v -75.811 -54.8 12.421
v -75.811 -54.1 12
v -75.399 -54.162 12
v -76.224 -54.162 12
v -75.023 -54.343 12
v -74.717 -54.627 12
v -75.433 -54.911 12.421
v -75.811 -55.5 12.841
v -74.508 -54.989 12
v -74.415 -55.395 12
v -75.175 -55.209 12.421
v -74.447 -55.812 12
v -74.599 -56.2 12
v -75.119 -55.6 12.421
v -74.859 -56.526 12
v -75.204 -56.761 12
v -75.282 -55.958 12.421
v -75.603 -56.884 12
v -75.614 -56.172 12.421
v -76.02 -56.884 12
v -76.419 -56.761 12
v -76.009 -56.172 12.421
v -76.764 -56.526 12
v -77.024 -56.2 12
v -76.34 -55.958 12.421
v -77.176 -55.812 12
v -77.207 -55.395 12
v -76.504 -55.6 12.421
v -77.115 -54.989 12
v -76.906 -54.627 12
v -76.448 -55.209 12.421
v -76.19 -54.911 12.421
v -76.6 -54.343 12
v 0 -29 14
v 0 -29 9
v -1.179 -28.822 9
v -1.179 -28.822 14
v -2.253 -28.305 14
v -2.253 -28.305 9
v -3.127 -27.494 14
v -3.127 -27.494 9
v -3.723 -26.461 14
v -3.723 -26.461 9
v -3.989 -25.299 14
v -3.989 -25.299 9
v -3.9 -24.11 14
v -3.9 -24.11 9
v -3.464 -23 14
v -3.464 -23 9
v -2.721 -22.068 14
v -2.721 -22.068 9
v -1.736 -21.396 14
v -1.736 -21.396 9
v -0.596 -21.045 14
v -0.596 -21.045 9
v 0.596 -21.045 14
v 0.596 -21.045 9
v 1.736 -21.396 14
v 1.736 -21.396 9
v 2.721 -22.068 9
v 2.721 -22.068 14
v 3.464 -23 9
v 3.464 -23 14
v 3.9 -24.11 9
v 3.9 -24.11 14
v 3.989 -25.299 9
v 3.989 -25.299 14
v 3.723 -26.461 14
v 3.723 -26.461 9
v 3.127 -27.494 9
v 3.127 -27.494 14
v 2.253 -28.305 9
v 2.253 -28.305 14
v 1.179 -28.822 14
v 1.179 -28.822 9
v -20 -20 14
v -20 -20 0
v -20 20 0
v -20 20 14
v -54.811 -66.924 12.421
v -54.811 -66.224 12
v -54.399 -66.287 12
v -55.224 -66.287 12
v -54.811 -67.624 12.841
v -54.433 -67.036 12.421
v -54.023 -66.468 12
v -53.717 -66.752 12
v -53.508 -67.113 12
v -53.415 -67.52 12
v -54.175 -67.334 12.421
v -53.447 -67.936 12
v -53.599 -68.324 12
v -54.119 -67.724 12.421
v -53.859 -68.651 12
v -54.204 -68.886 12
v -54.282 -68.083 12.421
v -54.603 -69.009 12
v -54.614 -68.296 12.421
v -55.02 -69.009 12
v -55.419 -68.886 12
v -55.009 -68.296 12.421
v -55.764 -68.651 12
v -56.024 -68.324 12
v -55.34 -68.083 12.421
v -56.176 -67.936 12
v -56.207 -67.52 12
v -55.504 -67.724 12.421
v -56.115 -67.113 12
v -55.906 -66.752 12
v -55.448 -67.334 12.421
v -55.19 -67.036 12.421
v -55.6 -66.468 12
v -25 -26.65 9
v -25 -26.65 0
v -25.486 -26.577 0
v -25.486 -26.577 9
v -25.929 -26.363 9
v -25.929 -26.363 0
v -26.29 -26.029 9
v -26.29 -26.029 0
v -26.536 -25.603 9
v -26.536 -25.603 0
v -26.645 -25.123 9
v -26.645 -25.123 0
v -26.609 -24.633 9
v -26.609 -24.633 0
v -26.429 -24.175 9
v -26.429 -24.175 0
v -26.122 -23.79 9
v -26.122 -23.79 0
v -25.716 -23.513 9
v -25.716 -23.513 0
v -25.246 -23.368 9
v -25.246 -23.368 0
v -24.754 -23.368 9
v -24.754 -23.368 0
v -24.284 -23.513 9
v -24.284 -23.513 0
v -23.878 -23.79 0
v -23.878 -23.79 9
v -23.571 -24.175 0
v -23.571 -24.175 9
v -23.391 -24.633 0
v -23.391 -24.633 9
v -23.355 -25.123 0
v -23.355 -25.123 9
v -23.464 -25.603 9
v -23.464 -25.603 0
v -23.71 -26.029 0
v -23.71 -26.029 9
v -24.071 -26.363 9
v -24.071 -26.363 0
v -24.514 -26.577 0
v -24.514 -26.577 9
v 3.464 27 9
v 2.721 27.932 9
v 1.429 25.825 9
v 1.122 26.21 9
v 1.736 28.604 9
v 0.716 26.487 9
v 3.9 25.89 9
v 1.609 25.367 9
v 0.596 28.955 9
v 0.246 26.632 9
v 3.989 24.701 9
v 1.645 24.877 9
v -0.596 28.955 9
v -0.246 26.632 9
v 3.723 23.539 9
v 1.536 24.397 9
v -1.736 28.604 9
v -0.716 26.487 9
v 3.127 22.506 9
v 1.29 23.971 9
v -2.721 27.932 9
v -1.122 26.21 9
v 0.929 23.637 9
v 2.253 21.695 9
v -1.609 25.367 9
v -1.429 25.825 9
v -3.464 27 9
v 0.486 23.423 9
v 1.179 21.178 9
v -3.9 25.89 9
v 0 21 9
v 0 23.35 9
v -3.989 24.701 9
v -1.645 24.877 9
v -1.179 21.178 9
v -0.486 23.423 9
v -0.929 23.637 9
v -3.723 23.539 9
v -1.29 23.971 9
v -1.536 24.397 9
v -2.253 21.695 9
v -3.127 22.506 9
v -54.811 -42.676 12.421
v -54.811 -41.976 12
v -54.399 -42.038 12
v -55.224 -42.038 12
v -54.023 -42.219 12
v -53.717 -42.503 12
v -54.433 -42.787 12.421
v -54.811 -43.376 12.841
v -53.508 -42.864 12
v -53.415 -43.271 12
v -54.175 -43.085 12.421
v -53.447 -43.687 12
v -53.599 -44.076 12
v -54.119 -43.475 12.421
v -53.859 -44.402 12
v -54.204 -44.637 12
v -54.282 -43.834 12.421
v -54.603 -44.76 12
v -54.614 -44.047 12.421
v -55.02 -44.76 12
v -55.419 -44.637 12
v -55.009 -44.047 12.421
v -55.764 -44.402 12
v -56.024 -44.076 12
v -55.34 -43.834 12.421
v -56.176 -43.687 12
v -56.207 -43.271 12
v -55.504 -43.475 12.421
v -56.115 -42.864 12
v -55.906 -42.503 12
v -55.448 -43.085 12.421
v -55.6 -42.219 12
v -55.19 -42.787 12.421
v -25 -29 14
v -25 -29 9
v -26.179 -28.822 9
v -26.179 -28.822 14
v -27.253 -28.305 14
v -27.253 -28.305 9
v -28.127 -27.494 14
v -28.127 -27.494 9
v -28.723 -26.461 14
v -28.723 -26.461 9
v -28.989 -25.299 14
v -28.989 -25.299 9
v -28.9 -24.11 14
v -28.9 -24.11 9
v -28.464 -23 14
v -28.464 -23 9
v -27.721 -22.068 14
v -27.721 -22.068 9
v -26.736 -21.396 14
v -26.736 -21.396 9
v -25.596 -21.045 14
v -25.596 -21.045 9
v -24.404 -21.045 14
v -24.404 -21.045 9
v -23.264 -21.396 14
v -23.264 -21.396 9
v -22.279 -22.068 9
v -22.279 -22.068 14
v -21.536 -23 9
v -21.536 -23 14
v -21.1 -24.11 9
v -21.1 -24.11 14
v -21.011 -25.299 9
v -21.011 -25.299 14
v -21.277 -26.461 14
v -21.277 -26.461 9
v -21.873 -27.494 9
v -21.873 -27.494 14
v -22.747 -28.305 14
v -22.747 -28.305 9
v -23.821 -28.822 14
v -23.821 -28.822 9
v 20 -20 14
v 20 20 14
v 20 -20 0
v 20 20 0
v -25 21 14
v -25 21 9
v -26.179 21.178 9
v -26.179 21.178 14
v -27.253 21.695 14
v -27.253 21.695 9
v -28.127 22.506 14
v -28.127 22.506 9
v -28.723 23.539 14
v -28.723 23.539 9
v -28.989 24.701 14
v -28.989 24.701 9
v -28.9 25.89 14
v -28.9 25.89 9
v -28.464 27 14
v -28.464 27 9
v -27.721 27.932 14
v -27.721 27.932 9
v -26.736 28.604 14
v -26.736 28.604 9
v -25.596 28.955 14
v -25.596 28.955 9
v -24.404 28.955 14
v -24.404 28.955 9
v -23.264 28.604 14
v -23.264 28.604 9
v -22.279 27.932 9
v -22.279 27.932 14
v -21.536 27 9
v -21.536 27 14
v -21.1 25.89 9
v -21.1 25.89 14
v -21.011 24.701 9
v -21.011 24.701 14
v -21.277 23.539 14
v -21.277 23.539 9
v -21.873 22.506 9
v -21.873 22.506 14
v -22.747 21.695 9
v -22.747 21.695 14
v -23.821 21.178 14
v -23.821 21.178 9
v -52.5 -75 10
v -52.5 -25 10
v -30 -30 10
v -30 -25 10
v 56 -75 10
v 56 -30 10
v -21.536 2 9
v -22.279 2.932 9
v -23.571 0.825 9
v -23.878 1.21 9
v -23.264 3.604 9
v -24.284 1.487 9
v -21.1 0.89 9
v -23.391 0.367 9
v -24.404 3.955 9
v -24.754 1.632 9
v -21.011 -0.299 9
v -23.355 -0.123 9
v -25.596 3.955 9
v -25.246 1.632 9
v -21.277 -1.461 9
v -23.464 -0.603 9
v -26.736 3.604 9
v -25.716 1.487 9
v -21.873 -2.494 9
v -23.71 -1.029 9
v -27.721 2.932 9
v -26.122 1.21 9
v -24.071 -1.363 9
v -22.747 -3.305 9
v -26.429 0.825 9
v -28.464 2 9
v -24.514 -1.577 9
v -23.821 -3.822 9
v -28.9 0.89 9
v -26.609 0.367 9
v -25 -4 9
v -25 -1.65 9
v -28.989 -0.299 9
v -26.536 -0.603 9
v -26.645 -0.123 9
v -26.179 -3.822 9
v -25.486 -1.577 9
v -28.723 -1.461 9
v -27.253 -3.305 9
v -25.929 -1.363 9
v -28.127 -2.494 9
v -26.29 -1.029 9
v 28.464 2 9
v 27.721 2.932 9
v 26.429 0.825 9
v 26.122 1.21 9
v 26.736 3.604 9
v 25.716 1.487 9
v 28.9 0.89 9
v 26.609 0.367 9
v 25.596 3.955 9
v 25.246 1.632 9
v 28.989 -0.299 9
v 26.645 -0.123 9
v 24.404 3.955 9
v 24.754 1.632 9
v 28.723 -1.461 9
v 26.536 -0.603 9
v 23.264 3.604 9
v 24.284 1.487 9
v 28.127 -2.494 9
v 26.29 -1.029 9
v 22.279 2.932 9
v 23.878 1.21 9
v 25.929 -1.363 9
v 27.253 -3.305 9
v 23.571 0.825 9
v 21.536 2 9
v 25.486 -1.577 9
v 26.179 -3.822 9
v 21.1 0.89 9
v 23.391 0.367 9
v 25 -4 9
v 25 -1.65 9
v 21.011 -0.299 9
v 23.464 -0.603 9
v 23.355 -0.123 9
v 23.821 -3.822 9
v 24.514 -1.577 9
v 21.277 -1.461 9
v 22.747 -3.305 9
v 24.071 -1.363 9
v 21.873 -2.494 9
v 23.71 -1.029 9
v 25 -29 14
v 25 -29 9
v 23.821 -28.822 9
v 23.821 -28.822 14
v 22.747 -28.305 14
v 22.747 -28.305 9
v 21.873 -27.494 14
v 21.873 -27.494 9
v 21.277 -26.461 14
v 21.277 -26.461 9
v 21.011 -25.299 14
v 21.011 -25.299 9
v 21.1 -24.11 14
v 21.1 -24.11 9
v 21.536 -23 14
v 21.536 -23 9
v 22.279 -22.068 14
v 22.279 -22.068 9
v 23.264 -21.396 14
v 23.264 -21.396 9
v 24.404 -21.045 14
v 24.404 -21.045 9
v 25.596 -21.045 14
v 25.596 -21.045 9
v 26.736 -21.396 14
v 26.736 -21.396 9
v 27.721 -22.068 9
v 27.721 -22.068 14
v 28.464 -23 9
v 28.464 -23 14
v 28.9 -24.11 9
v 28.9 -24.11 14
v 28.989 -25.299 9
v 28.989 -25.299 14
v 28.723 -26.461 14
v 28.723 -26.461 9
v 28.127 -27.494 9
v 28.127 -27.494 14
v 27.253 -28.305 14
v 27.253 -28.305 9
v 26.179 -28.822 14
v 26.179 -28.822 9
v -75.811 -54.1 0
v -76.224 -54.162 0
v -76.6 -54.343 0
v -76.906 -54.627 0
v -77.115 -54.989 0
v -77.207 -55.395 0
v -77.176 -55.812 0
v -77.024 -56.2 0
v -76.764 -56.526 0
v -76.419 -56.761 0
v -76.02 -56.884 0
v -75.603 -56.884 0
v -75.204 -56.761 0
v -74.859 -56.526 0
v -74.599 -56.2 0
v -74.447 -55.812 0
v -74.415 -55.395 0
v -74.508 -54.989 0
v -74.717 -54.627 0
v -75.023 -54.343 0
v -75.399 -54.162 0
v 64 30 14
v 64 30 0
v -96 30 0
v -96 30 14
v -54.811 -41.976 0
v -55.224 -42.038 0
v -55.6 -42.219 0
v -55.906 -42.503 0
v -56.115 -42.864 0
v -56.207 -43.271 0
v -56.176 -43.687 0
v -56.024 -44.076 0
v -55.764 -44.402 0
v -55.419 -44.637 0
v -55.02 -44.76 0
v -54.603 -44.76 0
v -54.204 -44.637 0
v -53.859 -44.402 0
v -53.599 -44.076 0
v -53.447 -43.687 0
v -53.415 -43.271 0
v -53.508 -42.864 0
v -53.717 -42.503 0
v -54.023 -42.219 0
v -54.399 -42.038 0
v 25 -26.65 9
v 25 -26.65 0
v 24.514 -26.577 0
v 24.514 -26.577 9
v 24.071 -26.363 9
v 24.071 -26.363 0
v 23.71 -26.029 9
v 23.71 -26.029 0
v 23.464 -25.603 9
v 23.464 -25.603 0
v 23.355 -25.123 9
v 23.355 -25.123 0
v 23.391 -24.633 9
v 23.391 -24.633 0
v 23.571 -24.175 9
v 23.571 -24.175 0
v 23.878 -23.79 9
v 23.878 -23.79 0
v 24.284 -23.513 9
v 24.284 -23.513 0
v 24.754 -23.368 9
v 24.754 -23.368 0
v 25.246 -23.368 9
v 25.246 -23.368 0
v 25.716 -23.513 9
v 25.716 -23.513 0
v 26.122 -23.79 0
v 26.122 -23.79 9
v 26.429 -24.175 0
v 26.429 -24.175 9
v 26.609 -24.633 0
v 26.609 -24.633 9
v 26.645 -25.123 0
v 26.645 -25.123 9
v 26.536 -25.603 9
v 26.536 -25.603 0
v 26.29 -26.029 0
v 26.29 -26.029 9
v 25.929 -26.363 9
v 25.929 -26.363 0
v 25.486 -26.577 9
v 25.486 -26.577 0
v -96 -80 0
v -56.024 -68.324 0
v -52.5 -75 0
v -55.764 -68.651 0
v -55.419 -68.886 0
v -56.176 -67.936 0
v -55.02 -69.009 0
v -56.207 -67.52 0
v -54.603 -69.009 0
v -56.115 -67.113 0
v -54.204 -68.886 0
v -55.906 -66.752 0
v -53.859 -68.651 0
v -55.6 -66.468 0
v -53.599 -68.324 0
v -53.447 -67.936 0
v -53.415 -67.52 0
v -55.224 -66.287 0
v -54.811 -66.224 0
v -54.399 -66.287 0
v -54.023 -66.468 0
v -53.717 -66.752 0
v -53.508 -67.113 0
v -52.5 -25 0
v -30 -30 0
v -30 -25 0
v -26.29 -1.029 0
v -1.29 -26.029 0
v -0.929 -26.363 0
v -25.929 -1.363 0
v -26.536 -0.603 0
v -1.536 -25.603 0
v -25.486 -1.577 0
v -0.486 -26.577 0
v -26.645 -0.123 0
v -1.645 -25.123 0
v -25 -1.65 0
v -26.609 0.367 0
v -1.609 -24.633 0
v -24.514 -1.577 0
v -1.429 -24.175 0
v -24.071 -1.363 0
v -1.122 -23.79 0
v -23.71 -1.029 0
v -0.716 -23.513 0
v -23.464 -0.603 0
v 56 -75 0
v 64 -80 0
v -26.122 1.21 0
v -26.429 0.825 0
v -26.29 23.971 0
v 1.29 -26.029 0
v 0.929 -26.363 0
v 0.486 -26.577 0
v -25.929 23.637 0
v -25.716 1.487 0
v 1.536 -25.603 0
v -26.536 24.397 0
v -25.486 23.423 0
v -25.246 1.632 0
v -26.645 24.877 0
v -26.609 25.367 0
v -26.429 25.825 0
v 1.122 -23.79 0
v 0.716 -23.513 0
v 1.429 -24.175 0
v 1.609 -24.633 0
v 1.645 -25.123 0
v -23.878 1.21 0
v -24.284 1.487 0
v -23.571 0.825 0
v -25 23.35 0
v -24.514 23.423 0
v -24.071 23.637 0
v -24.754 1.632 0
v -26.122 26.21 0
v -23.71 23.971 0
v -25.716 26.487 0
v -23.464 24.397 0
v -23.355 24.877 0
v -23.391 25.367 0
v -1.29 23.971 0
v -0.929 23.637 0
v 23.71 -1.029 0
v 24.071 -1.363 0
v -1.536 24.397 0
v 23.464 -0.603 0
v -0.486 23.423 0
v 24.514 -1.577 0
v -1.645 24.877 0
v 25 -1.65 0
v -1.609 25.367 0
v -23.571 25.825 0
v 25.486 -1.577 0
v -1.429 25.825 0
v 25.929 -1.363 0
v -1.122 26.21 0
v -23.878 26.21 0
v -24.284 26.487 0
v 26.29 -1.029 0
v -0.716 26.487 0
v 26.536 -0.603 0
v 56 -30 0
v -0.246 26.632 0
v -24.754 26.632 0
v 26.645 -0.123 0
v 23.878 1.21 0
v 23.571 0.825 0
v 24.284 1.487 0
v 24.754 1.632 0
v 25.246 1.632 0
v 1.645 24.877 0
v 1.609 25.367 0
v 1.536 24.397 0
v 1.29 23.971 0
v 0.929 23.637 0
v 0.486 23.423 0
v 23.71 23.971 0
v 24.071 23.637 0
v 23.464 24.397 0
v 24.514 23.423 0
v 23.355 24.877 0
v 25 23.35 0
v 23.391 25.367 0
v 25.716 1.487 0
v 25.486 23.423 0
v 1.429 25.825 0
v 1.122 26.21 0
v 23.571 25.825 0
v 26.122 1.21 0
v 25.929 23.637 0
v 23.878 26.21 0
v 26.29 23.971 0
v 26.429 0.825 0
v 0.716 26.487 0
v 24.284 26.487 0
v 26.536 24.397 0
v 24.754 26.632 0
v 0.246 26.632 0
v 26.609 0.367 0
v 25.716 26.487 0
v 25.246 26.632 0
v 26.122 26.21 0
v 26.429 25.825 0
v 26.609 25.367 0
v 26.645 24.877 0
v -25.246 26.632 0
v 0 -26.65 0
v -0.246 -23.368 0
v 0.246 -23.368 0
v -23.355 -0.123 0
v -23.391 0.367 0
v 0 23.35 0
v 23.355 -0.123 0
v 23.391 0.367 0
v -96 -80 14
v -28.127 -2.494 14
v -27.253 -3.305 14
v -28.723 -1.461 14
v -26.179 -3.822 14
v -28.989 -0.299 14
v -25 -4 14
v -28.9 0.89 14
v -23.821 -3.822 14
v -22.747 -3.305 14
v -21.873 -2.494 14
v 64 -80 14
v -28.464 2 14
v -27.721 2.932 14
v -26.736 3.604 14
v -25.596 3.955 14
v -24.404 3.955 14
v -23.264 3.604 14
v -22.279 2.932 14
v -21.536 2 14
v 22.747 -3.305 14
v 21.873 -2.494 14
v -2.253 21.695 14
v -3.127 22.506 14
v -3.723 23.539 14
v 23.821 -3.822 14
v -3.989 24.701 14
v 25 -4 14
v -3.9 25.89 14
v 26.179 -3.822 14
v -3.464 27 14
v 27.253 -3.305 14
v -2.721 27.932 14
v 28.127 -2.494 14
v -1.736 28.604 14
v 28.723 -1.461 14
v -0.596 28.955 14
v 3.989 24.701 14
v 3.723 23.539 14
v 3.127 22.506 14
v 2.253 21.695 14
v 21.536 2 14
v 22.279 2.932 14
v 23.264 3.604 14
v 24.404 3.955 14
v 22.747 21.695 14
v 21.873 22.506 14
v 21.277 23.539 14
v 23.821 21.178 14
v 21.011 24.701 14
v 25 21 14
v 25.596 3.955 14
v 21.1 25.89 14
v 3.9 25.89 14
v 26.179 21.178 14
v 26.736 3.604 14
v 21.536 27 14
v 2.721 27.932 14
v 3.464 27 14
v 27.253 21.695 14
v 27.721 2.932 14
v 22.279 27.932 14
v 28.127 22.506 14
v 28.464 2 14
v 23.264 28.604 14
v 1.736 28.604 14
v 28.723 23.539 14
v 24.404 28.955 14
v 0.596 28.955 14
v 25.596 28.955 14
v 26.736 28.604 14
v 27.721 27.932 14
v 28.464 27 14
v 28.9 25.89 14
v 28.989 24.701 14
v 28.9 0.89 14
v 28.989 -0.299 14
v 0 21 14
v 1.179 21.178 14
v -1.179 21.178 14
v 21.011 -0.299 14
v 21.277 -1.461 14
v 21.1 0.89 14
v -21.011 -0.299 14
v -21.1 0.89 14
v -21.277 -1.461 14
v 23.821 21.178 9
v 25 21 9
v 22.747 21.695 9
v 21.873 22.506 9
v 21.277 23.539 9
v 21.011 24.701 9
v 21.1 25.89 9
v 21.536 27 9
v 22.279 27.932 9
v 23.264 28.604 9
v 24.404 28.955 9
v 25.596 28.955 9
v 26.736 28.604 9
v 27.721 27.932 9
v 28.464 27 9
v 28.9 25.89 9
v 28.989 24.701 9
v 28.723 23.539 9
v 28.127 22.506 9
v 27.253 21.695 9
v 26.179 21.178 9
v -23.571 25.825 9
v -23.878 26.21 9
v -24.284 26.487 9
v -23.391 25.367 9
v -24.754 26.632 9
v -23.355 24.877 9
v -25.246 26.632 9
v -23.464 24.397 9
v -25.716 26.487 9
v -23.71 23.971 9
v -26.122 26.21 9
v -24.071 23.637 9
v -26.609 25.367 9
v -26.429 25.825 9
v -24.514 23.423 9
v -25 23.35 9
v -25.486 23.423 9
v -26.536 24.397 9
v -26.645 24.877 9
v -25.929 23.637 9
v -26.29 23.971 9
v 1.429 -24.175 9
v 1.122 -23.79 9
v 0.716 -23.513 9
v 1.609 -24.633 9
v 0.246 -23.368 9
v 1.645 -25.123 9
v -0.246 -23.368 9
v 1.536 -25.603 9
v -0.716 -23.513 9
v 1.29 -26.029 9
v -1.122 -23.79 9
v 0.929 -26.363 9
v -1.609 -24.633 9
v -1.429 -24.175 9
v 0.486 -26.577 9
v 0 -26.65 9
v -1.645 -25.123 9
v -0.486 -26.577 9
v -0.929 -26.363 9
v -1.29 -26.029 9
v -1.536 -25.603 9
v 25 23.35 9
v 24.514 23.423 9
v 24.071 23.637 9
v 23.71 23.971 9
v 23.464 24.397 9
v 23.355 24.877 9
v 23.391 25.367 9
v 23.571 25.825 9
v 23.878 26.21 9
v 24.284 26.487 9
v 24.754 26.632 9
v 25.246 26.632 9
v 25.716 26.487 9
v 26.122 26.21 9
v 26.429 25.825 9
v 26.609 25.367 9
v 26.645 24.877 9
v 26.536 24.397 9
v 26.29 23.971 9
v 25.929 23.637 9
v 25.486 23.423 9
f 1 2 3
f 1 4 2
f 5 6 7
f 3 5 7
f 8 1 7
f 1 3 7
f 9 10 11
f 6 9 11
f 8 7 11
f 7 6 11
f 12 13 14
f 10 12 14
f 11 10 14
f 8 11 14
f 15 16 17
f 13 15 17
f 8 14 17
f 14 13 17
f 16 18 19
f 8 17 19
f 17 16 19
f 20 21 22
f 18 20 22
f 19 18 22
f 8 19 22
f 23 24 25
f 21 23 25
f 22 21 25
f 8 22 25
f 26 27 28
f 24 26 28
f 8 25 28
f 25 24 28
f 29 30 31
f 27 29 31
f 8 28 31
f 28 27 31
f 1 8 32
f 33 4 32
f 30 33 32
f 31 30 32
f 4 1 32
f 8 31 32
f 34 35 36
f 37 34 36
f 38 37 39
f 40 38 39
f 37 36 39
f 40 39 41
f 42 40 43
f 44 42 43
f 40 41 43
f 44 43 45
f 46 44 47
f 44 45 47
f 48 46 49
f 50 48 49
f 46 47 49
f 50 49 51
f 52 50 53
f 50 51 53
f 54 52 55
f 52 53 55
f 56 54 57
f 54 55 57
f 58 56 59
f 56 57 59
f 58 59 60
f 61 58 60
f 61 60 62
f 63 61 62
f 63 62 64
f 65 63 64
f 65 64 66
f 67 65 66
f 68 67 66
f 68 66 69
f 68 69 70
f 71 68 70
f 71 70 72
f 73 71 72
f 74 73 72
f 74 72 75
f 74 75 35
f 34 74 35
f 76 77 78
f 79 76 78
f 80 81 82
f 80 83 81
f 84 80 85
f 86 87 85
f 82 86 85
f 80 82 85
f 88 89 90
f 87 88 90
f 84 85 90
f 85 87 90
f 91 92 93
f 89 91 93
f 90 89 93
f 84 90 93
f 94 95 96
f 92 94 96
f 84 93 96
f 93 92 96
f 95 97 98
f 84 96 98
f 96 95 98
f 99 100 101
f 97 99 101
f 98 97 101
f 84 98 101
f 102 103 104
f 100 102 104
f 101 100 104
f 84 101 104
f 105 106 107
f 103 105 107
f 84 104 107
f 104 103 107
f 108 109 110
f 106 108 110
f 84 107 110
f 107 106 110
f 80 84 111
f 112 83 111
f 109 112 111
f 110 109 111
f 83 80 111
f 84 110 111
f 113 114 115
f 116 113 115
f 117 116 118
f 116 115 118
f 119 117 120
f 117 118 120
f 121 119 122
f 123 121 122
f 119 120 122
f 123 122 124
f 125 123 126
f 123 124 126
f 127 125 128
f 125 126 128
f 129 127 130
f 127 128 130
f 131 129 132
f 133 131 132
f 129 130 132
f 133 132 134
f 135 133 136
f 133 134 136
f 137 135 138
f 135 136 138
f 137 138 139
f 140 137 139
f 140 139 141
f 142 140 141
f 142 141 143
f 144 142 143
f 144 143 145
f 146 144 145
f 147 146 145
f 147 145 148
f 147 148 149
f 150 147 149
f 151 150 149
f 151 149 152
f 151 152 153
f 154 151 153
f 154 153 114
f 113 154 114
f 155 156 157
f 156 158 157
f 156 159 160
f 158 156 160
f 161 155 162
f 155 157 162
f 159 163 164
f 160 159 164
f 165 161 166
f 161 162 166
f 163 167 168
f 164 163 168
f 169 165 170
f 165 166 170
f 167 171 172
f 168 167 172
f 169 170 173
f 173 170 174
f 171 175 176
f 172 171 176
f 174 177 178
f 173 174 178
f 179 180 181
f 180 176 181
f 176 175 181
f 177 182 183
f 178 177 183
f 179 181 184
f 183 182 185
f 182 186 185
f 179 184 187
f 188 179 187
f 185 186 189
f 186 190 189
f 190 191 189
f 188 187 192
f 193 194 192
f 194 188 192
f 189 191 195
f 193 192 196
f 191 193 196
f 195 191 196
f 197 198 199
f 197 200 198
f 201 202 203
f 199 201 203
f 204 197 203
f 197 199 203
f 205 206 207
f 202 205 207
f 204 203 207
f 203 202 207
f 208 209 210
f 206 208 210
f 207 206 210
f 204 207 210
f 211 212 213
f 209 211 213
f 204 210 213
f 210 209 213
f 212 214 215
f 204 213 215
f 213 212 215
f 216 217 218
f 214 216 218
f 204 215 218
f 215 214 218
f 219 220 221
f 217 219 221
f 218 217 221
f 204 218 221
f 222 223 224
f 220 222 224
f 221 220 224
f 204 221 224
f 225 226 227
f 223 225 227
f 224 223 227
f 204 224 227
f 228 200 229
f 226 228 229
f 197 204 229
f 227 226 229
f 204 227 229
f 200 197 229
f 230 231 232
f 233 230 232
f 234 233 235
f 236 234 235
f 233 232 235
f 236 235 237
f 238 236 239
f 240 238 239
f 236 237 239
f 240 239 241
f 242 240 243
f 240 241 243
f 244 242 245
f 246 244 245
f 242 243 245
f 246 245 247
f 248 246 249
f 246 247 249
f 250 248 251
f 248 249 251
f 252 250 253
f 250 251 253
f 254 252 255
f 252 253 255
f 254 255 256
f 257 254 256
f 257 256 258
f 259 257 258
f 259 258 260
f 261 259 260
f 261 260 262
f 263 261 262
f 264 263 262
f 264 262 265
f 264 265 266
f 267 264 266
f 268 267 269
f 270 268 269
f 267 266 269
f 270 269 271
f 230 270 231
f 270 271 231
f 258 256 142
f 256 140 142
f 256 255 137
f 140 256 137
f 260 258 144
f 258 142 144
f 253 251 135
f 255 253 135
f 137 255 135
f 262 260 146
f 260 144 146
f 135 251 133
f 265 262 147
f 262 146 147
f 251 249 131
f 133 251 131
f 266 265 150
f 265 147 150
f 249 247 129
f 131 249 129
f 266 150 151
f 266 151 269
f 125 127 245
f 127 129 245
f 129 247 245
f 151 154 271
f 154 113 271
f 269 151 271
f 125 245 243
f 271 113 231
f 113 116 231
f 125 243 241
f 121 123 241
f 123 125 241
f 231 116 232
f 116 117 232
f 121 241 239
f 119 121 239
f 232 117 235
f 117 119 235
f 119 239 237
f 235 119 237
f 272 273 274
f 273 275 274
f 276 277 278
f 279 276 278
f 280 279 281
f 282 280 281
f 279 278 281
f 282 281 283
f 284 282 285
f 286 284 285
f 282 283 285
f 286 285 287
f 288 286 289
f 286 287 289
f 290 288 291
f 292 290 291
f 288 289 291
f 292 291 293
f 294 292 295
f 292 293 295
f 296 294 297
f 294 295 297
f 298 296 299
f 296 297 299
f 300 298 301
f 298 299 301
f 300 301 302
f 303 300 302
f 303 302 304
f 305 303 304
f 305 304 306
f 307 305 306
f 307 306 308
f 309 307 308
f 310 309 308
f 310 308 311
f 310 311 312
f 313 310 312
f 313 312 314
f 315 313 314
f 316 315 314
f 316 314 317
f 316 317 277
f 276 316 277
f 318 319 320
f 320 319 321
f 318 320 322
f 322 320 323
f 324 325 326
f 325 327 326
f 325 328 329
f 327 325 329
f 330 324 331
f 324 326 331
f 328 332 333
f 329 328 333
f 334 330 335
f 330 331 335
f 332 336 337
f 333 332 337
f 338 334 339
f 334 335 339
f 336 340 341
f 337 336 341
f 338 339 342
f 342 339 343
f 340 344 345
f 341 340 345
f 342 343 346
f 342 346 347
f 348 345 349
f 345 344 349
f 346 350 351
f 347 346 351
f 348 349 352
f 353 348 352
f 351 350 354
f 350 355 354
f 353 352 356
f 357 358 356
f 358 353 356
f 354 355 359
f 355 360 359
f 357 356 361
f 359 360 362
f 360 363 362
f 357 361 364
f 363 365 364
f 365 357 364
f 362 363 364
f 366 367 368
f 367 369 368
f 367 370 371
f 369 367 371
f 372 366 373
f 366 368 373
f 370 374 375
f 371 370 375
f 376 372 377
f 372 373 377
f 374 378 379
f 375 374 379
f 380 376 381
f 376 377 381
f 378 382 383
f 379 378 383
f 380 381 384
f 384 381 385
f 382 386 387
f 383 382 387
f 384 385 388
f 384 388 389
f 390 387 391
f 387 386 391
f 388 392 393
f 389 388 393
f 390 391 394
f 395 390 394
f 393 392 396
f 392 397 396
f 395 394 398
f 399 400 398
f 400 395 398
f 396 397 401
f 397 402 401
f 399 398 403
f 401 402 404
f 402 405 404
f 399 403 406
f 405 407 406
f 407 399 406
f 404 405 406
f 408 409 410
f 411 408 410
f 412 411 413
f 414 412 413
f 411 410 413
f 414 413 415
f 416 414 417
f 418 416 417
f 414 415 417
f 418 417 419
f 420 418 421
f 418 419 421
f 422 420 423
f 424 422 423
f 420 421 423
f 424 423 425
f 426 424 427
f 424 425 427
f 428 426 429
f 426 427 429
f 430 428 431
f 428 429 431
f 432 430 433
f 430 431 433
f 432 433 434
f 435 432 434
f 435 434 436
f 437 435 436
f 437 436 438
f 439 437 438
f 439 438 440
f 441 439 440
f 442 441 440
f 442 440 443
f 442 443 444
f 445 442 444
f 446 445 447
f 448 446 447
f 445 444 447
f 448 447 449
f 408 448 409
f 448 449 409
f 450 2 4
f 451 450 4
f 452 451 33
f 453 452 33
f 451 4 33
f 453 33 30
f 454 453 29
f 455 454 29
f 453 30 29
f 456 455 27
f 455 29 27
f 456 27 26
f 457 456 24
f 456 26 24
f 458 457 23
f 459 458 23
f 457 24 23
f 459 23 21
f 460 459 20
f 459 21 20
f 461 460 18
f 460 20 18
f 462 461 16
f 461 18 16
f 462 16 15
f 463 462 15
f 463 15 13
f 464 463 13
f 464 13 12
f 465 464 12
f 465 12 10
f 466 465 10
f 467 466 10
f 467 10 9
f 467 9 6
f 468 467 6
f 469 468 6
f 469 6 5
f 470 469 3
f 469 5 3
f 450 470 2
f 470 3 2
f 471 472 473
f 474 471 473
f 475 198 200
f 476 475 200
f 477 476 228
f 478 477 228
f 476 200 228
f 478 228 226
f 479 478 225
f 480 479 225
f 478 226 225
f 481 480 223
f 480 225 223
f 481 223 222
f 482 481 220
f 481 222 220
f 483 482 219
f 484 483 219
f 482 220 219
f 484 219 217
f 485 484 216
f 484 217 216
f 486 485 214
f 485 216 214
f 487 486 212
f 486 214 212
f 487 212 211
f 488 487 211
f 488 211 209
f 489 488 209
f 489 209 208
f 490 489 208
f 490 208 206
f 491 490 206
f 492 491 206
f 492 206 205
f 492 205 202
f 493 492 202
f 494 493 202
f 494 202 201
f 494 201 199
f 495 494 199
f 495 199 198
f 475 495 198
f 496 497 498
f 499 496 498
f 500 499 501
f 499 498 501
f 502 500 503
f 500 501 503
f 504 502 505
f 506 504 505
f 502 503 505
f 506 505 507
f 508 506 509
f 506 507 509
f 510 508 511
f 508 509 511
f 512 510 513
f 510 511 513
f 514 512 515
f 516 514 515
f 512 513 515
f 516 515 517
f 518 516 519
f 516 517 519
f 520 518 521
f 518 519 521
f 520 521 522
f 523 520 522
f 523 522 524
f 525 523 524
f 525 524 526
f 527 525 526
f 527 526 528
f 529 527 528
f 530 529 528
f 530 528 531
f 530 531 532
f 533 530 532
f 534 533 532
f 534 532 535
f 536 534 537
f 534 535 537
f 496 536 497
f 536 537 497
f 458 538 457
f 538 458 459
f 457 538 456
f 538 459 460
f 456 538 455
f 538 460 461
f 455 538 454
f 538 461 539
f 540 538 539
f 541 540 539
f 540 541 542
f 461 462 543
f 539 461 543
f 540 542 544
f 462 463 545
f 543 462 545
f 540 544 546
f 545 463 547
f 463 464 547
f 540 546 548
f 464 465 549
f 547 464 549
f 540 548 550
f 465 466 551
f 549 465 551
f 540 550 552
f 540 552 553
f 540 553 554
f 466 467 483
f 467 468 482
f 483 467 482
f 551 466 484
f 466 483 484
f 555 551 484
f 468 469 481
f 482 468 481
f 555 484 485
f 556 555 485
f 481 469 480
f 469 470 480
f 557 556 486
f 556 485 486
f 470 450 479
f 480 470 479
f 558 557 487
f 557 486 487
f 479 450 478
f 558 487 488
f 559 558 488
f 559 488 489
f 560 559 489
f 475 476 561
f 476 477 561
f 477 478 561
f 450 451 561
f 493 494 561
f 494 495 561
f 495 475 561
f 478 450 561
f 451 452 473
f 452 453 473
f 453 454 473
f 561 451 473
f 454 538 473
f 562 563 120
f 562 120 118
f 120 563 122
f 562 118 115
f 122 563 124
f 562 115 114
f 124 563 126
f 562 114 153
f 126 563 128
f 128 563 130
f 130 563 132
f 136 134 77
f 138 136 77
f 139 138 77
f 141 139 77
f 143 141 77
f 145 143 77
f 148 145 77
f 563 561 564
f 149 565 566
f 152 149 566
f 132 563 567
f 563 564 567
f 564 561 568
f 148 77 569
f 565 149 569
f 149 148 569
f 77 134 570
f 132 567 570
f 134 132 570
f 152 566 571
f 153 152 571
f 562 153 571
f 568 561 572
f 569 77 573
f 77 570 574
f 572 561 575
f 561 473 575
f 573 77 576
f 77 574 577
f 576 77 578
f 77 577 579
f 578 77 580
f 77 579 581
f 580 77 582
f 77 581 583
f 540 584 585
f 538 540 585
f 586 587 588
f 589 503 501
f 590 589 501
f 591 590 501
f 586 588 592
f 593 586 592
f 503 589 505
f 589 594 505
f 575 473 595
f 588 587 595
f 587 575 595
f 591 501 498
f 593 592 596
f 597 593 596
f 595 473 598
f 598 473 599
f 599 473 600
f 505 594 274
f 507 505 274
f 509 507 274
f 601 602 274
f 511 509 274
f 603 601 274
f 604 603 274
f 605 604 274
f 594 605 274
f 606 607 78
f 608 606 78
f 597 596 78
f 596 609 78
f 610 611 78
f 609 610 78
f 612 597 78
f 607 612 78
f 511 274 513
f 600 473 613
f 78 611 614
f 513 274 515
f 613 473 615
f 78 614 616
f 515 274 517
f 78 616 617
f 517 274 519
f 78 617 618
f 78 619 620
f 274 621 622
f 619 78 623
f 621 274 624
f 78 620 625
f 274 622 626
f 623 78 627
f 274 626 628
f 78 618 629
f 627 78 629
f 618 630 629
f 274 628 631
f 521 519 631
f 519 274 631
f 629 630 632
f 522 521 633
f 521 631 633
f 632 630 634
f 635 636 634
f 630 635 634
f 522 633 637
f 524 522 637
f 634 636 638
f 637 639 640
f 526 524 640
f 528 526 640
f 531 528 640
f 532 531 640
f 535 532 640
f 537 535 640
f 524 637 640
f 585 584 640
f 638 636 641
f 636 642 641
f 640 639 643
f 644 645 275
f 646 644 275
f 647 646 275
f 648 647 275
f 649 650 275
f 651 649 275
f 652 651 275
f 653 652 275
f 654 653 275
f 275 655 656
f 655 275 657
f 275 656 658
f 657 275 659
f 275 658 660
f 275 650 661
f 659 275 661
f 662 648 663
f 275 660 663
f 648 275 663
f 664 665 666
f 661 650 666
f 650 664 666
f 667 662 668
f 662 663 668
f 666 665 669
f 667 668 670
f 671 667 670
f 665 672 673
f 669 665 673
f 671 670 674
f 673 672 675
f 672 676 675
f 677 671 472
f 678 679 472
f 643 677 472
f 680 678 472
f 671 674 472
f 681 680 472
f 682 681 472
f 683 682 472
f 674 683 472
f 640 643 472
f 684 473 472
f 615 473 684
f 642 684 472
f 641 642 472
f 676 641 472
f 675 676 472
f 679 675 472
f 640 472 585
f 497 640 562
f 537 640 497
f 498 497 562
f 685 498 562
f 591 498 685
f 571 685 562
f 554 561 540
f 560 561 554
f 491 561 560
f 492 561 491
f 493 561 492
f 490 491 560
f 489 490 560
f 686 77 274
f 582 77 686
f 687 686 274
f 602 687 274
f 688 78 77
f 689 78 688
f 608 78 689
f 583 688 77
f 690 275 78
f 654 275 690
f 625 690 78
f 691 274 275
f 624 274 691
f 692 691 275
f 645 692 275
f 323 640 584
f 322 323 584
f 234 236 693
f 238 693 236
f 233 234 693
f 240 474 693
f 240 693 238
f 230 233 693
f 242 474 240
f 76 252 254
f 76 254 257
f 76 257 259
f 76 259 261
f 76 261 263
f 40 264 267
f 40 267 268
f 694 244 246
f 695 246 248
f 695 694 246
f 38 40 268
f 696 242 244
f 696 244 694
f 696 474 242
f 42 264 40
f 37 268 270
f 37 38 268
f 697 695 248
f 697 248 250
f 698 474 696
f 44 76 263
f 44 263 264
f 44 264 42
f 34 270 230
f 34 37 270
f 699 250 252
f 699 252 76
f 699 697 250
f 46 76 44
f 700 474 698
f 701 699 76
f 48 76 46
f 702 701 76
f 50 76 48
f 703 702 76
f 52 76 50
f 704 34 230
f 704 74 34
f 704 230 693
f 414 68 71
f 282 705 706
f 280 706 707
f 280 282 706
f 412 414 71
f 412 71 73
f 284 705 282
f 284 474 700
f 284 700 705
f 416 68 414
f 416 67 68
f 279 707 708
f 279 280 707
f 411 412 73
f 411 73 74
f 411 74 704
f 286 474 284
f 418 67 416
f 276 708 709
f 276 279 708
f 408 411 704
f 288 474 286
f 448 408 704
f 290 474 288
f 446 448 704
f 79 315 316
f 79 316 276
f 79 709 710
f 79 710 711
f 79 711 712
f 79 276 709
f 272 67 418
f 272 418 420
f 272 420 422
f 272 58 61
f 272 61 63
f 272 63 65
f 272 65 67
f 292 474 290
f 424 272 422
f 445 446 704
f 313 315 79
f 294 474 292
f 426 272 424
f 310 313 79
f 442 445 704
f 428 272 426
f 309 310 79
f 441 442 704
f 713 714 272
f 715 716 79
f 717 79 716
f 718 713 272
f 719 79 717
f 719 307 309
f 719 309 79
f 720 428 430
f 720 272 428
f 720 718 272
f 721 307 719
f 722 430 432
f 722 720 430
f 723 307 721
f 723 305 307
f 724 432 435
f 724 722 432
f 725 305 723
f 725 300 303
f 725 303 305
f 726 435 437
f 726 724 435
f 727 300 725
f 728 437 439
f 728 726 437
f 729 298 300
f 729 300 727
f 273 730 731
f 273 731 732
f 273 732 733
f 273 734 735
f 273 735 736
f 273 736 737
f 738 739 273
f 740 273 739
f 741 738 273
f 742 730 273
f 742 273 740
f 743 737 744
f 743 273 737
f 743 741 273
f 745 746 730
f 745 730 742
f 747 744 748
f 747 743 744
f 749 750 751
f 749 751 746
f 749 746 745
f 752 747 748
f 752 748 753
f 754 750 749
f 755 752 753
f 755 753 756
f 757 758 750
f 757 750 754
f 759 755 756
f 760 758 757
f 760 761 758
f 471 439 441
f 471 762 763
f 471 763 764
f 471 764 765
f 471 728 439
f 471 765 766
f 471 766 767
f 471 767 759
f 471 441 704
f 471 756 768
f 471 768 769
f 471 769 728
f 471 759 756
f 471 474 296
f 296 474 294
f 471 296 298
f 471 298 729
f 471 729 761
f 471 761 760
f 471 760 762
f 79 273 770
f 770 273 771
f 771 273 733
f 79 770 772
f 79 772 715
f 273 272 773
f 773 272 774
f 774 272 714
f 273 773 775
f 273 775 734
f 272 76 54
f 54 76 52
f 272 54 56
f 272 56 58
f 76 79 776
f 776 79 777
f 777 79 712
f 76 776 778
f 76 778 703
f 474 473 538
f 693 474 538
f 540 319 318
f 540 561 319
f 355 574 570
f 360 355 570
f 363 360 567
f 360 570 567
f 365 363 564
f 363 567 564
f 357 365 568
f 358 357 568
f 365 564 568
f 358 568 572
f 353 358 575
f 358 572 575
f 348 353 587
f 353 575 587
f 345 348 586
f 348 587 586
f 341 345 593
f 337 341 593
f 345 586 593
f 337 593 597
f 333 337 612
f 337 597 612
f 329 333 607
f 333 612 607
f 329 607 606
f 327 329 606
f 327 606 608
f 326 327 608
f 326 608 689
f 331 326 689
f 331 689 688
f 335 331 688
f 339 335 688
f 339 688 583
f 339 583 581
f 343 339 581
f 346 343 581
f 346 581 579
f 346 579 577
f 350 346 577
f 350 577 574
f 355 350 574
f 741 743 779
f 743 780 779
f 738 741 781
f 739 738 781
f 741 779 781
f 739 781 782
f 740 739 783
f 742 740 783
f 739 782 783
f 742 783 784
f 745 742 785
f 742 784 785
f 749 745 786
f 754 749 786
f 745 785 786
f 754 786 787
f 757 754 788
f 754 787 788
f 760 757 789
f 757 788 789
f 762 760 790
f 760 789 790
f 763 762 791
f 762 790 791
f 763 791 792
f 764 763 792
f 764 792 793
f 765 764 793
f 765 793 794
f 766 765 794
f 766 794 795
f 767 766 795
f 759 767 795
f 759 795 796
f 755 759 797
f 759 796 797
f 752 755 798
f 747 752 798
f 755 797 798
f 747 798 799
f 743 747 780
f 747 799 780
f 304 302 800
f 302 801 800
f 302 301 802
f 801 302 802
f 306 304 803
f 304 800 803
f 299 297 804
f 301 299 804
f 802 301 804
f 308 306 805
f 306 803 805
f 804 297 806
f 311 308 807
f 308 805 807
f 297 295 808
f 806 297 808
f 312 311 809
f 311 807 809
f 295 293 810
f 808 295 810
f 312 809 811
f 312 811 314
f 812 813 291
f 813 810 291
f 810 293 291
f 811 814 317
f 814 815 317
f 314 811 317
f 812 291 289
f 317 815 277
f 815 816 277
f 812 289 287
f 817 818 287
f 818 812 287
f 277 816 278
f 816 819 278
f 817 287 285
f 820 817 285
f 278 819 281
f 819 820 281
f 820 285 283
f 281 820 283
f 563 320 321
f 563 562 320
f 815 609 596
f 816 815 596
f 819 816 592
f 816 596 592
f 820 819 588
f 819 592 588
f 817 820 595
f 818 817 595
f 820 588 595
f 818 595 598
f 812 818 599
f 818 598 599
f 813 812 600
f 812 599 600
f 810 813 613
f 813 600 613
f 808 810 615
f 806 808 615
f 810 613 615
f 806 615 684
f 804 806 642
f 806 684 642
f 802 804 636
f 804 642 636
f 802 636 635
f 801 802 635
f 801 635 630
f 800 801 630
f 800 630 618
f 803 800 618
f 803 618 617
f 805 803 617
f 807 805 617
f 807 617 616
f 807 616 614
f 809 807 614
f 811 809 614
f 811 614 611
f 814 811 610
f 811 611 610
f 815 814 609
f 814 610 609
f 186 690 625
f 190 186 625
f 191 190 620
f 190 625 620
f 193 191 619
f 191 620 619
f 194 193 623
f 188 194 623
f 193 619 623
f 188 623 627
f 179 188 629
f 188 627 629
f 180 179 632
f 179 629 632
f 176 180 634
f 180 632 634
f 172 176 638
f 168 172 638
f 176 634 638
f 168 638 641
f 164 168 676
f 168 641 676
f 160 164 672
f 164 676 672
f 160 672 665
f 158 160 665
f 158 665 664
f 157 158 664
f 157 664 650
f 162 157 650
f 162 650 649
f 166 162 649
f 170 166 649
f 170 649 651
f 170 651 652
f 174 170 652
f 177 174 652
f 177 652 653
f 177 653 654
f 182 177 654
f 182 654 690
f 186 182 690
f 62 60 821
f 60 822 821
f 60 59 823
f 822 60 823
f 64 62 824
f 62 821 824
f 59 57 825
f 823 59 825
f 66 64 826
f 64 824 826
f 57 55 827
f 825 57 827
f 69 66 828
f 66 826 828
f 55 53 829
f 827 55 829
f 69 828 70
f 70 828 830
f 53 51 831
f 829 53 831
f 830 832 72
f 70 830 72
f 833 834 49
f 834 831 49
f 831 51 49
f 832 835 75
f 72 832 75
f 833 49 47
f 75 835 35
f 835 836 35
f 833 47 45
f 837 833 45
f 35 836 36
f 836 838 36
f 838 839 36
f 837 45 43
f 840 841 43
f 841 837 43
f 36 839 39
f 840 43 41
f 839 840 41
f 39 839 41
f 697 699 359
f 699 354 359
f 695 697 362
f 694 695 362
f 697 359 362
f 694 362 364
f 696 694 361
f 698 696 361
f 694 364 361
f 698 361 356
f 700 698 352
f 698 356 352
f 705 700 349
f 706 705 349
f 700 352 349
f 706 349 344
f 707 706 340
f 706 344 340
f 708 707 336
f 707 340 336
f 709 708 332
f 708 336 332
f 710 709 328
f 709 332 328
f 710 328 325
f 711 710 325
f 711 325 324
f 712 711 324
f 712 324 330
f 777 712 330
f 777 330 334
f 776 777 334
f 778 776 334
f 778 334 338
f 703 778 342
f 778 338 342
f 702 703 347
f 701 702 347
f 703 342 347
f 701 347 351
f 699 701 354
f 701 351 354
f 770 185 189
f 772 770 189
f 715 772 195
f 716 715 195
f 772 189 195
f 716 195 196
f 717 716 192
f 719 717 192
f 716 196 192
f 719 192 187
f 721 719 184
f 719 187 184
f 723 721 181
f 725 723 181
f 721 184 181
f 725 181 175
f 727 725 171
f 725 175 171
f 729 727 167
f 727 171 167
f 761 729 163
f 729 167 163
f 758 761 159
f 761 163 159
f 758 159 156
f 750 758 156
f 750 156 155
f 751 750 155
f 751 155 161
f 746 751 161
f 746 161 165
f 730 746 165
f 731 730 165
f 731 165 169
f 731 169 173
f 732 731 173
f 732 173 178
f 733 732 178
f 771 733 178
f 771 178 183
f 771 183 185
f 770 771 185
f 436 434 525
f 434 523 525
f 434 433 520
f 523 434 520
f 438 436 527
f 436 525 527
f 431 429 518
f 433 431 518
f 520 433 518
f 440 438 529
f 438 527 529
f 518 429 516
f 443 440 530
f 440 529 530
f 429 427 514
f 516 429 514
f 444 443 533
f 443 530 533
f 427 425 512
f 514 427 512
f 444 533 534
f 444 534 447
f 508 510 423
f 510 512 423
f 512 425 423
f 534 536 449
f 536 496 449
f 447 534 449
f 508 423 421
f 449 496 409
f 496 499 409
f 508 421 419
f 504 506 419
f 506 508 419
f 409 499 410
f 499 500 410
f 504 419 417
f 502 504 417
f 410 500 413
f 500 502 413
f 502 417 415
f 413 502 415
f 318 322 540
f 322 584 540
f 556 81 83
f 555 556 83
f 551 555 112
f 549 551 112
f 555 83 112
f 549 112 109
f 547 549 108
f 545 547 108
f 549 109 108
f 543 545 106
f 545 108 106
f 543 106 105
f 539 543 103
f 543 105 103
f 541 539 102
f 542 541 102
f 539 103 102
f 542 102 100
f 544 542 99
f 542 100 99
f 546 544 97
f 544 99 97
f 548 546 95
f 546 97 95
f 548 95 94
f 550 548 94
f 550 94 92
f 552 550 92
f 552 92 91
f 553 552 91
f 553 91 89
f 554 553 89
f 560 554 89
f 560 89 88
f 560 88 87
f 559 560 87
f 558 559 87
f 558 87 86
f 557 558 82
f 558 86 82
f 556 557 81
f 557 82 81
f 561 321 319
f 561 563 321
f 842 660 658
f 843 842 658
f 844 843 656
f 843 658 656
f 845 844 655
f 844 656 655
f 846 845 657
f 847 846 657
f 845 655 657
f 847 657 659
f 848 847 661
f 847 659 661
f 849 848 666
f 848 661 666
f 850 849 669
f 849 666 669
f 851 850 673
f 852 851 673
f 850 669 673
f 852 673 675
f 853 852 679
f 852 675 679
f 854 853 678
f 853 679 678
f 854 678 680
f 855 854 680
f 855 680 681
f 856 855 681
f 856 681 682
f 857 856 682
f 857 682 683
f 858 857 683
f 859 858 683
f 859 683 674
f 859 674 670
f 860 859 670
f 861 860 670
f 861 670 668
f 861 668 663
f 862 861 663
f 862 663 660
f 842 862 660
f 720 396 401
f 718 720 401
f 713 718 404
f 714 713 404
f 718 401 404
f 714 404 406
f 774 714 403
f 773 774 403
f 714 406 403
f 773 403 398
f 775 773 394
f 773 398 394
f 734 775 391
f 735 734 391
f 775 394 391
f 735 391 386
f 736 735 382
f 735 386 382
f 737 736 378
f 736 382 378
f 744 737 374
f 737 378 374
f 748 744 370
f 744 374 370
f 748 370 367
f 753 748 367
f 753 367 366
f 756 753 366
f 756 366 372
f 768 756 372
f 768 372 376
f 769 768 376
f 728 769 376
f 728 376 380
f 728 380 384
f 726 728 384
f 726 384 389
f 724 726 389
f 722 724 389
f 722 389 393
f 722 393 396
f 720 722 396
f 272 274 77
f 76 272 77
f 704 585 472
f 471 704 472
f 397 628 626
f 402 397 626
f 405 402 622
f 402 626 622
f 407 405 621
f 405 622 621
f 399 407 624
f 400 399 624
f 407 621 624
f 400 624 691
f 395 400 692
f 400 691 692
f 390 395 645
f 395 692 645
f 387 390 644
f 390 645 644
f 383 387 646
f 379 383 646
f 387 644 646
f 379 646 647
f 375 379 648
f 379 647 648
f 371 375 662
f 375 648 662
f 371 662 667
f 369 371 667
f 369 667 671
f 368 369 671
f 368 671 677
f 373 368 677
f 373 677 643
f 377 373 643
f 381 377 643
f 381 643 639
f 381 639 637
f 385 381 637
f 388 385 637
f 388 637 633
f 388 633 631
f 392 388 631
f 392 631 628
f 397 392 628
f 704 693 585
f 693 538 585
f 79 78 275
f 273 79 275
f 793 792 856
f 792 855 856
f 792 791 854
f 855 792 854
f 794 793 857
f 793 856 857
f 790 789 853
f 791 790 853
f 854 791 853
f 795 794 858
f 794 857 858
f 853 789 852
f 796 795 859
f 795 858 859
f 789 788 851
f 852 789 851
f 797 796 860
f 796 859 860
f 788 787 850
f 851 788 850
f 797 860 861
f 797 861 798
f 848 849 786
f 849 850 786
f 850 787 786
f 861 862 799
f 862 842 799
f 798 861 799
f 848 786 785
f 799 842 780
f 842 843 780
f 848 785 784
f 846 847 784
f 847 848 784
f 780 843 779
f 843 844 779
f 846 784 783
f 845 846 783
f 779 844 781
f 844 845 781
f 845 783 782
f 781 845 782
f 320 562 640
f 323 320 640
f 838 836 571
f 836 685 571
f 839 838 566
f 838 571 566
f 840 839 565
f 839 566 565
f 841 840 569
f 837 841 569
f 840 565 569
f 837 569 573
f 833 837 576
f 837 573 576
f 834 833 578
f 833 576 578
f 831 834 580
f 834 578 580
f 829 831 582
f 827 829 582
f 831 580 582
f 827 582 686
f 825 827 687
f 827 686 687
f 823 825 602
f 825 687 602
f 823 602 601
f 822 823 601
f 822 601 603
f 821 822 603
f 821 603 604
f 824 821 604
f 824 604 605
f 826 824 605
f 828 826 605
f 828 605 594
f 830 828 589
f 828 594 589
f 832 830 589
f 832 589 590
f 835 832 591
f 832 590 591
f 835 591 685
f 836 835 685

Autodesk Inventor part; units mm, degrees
ref_plane "YZ Plane" through (0, 0, 0) normal (1, 0, 0) x (0, 1, 0)
ref_plane "XZ Plane" through (0, 0, 0) normal (0, 1, 0) x (-1, 0, 0)
ref_plane "XY Plane" through (0, 0, 0) normal (0, 0, 1) x (1, 0, 0)
ref_plane "Work Plane1" through (0, 0, 0) normal (0, 0, 1) x (1, 0, 0)
sketch "Sketch1" plane through (0, 0, 0) normal (0, 0, 1) x (1, 0, 0)
  circle A0 centre (0, 25) radius 1.95 construction
  circle A1 centre (-25, 0) radius 1.95 construction
  circle A2 centre (-25, -25) radius 1.95 construction
  circle A3 centre (25, 25) radius 1.95 construction
  circle A4 centre (25, -25) radius 1.95 construction
  circle A5 centre (-25, 25) radius 1.95 construction
  circle A6 centre (25, 0) radius 1.95 construction
  circle A7 centre (0, -25) radius 1.95 construction
  line L0 (-28, 30) -> (-30, 28) construction
  line L1 (-30, 28) -> (-30, -28) construction
  line L2 (-30, -28) -> (-28, -30) construction
  line L3 (-28, -30) -> (28, -30) construction
  line L4 (28, -30) -> (30, -28) construction
  line L5 (30, -28) -> (30, 28) construction
  line L6 (30, 28) -> (28, 30) construction
  line L7 (28, 30) -> (-28, 30) construction
  circle A8 centre (35, -56) radius 1 construction
  circle A9 centre (5, -48.5) radius 1 construction
  circle A10 centre (5, -64.5) radius 1.0474 construction
  circle A11 centre (-5, -64.5) radius 1 construction
  circle A12 centre (-5, -56) radius 1 construction
  circle A13 centre (-5, -48.5) radius 1 construction
  circle A14 centre (5, -56) radius 1 construction
  circle A15 centre (35, -48) radius 1 construction
  circle A16 centre (35, -64) radius 1 construction
  line L8 (38, -40) -> (38, -72) construction
  line L9 (38, -40) -> (-10, -40) construction
  line L10 (-10, -72) -> (-10, -40) construction
  line L11 (38, -72) -> (-10, -72) construction
  line L12 (38, -71) -> (38, -41) construction
  line L13 (38, -71) -> (48, -71) construction
  line L14 (48, -41) -> (48, -71) construction
  line L15 (38, -41) -> (48, -41) construction
  line L16 (56, -75) -> (-52.5, -75)
  line L17 (-52.5, -75) -> (-52.5, -30)
  line L18 (-52.5, -30) -> (56, -30)
  line L19 (56, -30) -> (56, -75)
  line L20 (-40, -41.1445) -> (-40, -68) construction
  line L21 (-41, -39.0927) -> (-41, -47.7587) construction
  line L22 (-41, -39.0927) -> (-46.5, -39.0927) construction
  line L23 (-46.5, -47.7587) -> (-46.5, -39.0927) construction
  line L24 (-41, -47.7587) -> (-46.5, -47.7587) construction
  line L25 (-41, -60.5) -> (-41, -64) construction
  line L26 (-41, -60.5) -> (-46.5, -60.5) construction
  line L27 (-46.5, -64) -> (-46.5, -60.5) construction
  line L28 (-41, -64) -> (-46.5, -64) construction
  line L29 (64, 30) -> (-96, 30)
  line L30 (-96, 30) -> (-96, -80)
  line L31 (-96, -80) -> (64, -80)
  line L32 (64, -80) -> (64, 30)
  line L33 (20, -20) -> (-20, -20)
  line L34 (-20, -20) -> (-20, 20)
  line L35 (-20, 20) -> (20, 20)
  line L36 (20, 20) -> (20, -20)
  line L37 (20, -20) -> (-20, 20) construction
  line L38 (-20, -20) -> (20, 20) construction
  line L39 (-52.5, -30) -> (-30, -30)
  line L40 (-30, -30) -> (-30, -25)
  line L41 (-30, -25) -> (-52.5, -25)
  line L42 (-52.5, -25) -> (-52.5, -30)
  point P0 (0, 0)
  dimension "d1" = 3
  dimension "d2" = 8
  dimension "d4" = 6
  dimension "d5" = 160
  dimension "d6" = 110
  dimension "d7" = 8
  dimension "d19" = 40
  dimension "d20" = 40
  dimension "d28" = 5
  dimension "d29" = 0
extrude "Extrusion1" add sketch "Sketch1" along normal blind 10
sketch "Sketch2" plane through (0, 0, 10) normal (0, 0, 1) x (1, 0, 0)
  line L0 (-30, -30) -> (56, -30) projected
  line L1 (56, -30) -> (56, -75) projected
  line L2 (56, -75) -> (-52.5, -75) projected
  line L3 (64, 30) -> (-96, 30) projected
  line L4 (-96, 30) -> (-96, -80) projected
  line L5 (-96, -80) -> (64, -80) projected
  line L6 (64, -80) -> (64, 30) projected
  line L7 (20, -20) -> (20, 20) projected
  line L8 (-20, -20) -> (20, -20)
  line L9 (20, -20) -> (20, 20)
  line L10 (20, 20) -> (-20, 20)
  line L11 (-20, 20) -> (-20, -20)
  line L12 (-20, -20) -> (20, 20) construction
  line L13 (20, -20) -> (-20, 20) construction
  line L14 (-52.5, -25) -> (-30, -25) projected
  line L15 (-30, -25) -> (-30, -30) projected
  line L16 (-52.5, -75) -> (-52.5, -25) projected
  point P0 (0, 0)
extrude "Extrusion2" add sketch "Sketch2" along normal blind 4 contours L0 L1 L2 L16 L14 L15 | L6 L5 L4 L3
sketch "Sketch3" plane through (0, 0, 14) normal (0, 0, 1) x (1, 0, 0)
  circle A0 centre (0, 25) radius 1.95 construction
  circle A1 centre (-25, 0) radius 1.95 construction
  circle A2 centre (-25, -25) radius 1.95 construction
  circle A3 centre (25, 25) radius 1.95 construction
  circle A4 centre (25, -25) radius 1.95 construction
  circle A5 centre (-25, 25) radius 1.95 construction
  circle A6 centre (25, 0) radius 1.95 construction
  circle A7 centre (0, -25) radius 1.95 construction
  line L0 (-28, 30) -> (-30, 28) construction
  line L1 (-30, 28) -> (-30, -28) construction
  line L2 (-30, -28) -> (-28, -30) construction
  line L3 (-28, -30) -> (28, -30) construction
  line L4 (28, -30) -> (30, -28) construction
  line L5 (30, -28) -> (30, 28) construction
  line L6 (30, 28) -> (28, 30) construction
  line L7 (28, 30) -> (-28, 30) construction
  point P0 (0, 0)
hole "Hole1" at (25, 25, 14) at (0, 25, 14) at (-25, 25, 14) at (-25, 0, 14) at (-25, -25, 14) at (0, -25, 14) at (25, -25, 14) at (25, 0, 14) direction (0, 0, -1) diameter 3.3 end through all counterbore diameter 8 counterbore depth 5
sketch "Sketch4" plane through (0, 0, 0) normal (0, 0, -1) x (-1, 0, 0)
  line L0 (52.5, -75) -> (-56, -75) construction
  line L1 (-56, -75) -> (-56, -30) construction
  line L2 (-56, -30) -> (30, -30) construction
  line L3 (20, 20) -> (20, -20) construction
  line L4 (20, -20) -> (-20, -20) construction
  line L5 (-20, -20) -> (-20, 20) construction
  line L6 (-20, 20) -> (20, 20) construction
  line L7 (-64, 30) -> (96, 30) construction
  line L8 (-64, -80) -> (-64, 30) construction
  line L9 (96, -80) -> (-64, -80) construction
  line L10 (96, 30) -> (96, -80) construction
  line L11 (54.8114, -67.6244) -> (54.8114, -43.3756) construction
  line L12 (54.8114, -43.3756) -> (75.8114, -55.5) construction
  line L13 (75.8114, -55.5) -> (54.8114, -67.6244) construction
  line L14 (96, 30) -> (96, -80) construction
  line L15 (30, -30) -> (30, -25) projected
  line L16 (30, -25) -> (52.5, -25) projected
  line L17 (52.5, -25) -> (52.5, -75) projected
  line L18 (20, -49.5) -> (16.4, -49.5)
  line L19 (20, -61.5) -> (16.4, -61.5)
  circle A0 centre (5, -55.5) radius 1.8 projected
  point P0 (0, 0)
  point P1 (61.8114, -55.5)
  dimension "d30" = 21
  dimension "d31" = 0
hole "Hole2" at (-54.8114, -43.3756, 0) at (-75.8114, -55.5, 0) at (-54.8114, -67.6244, 0) direction (0, 0, 1) diameter 2.8 depth 12 tip angle 118
properties part number "cellSTORM_Base_v0"
